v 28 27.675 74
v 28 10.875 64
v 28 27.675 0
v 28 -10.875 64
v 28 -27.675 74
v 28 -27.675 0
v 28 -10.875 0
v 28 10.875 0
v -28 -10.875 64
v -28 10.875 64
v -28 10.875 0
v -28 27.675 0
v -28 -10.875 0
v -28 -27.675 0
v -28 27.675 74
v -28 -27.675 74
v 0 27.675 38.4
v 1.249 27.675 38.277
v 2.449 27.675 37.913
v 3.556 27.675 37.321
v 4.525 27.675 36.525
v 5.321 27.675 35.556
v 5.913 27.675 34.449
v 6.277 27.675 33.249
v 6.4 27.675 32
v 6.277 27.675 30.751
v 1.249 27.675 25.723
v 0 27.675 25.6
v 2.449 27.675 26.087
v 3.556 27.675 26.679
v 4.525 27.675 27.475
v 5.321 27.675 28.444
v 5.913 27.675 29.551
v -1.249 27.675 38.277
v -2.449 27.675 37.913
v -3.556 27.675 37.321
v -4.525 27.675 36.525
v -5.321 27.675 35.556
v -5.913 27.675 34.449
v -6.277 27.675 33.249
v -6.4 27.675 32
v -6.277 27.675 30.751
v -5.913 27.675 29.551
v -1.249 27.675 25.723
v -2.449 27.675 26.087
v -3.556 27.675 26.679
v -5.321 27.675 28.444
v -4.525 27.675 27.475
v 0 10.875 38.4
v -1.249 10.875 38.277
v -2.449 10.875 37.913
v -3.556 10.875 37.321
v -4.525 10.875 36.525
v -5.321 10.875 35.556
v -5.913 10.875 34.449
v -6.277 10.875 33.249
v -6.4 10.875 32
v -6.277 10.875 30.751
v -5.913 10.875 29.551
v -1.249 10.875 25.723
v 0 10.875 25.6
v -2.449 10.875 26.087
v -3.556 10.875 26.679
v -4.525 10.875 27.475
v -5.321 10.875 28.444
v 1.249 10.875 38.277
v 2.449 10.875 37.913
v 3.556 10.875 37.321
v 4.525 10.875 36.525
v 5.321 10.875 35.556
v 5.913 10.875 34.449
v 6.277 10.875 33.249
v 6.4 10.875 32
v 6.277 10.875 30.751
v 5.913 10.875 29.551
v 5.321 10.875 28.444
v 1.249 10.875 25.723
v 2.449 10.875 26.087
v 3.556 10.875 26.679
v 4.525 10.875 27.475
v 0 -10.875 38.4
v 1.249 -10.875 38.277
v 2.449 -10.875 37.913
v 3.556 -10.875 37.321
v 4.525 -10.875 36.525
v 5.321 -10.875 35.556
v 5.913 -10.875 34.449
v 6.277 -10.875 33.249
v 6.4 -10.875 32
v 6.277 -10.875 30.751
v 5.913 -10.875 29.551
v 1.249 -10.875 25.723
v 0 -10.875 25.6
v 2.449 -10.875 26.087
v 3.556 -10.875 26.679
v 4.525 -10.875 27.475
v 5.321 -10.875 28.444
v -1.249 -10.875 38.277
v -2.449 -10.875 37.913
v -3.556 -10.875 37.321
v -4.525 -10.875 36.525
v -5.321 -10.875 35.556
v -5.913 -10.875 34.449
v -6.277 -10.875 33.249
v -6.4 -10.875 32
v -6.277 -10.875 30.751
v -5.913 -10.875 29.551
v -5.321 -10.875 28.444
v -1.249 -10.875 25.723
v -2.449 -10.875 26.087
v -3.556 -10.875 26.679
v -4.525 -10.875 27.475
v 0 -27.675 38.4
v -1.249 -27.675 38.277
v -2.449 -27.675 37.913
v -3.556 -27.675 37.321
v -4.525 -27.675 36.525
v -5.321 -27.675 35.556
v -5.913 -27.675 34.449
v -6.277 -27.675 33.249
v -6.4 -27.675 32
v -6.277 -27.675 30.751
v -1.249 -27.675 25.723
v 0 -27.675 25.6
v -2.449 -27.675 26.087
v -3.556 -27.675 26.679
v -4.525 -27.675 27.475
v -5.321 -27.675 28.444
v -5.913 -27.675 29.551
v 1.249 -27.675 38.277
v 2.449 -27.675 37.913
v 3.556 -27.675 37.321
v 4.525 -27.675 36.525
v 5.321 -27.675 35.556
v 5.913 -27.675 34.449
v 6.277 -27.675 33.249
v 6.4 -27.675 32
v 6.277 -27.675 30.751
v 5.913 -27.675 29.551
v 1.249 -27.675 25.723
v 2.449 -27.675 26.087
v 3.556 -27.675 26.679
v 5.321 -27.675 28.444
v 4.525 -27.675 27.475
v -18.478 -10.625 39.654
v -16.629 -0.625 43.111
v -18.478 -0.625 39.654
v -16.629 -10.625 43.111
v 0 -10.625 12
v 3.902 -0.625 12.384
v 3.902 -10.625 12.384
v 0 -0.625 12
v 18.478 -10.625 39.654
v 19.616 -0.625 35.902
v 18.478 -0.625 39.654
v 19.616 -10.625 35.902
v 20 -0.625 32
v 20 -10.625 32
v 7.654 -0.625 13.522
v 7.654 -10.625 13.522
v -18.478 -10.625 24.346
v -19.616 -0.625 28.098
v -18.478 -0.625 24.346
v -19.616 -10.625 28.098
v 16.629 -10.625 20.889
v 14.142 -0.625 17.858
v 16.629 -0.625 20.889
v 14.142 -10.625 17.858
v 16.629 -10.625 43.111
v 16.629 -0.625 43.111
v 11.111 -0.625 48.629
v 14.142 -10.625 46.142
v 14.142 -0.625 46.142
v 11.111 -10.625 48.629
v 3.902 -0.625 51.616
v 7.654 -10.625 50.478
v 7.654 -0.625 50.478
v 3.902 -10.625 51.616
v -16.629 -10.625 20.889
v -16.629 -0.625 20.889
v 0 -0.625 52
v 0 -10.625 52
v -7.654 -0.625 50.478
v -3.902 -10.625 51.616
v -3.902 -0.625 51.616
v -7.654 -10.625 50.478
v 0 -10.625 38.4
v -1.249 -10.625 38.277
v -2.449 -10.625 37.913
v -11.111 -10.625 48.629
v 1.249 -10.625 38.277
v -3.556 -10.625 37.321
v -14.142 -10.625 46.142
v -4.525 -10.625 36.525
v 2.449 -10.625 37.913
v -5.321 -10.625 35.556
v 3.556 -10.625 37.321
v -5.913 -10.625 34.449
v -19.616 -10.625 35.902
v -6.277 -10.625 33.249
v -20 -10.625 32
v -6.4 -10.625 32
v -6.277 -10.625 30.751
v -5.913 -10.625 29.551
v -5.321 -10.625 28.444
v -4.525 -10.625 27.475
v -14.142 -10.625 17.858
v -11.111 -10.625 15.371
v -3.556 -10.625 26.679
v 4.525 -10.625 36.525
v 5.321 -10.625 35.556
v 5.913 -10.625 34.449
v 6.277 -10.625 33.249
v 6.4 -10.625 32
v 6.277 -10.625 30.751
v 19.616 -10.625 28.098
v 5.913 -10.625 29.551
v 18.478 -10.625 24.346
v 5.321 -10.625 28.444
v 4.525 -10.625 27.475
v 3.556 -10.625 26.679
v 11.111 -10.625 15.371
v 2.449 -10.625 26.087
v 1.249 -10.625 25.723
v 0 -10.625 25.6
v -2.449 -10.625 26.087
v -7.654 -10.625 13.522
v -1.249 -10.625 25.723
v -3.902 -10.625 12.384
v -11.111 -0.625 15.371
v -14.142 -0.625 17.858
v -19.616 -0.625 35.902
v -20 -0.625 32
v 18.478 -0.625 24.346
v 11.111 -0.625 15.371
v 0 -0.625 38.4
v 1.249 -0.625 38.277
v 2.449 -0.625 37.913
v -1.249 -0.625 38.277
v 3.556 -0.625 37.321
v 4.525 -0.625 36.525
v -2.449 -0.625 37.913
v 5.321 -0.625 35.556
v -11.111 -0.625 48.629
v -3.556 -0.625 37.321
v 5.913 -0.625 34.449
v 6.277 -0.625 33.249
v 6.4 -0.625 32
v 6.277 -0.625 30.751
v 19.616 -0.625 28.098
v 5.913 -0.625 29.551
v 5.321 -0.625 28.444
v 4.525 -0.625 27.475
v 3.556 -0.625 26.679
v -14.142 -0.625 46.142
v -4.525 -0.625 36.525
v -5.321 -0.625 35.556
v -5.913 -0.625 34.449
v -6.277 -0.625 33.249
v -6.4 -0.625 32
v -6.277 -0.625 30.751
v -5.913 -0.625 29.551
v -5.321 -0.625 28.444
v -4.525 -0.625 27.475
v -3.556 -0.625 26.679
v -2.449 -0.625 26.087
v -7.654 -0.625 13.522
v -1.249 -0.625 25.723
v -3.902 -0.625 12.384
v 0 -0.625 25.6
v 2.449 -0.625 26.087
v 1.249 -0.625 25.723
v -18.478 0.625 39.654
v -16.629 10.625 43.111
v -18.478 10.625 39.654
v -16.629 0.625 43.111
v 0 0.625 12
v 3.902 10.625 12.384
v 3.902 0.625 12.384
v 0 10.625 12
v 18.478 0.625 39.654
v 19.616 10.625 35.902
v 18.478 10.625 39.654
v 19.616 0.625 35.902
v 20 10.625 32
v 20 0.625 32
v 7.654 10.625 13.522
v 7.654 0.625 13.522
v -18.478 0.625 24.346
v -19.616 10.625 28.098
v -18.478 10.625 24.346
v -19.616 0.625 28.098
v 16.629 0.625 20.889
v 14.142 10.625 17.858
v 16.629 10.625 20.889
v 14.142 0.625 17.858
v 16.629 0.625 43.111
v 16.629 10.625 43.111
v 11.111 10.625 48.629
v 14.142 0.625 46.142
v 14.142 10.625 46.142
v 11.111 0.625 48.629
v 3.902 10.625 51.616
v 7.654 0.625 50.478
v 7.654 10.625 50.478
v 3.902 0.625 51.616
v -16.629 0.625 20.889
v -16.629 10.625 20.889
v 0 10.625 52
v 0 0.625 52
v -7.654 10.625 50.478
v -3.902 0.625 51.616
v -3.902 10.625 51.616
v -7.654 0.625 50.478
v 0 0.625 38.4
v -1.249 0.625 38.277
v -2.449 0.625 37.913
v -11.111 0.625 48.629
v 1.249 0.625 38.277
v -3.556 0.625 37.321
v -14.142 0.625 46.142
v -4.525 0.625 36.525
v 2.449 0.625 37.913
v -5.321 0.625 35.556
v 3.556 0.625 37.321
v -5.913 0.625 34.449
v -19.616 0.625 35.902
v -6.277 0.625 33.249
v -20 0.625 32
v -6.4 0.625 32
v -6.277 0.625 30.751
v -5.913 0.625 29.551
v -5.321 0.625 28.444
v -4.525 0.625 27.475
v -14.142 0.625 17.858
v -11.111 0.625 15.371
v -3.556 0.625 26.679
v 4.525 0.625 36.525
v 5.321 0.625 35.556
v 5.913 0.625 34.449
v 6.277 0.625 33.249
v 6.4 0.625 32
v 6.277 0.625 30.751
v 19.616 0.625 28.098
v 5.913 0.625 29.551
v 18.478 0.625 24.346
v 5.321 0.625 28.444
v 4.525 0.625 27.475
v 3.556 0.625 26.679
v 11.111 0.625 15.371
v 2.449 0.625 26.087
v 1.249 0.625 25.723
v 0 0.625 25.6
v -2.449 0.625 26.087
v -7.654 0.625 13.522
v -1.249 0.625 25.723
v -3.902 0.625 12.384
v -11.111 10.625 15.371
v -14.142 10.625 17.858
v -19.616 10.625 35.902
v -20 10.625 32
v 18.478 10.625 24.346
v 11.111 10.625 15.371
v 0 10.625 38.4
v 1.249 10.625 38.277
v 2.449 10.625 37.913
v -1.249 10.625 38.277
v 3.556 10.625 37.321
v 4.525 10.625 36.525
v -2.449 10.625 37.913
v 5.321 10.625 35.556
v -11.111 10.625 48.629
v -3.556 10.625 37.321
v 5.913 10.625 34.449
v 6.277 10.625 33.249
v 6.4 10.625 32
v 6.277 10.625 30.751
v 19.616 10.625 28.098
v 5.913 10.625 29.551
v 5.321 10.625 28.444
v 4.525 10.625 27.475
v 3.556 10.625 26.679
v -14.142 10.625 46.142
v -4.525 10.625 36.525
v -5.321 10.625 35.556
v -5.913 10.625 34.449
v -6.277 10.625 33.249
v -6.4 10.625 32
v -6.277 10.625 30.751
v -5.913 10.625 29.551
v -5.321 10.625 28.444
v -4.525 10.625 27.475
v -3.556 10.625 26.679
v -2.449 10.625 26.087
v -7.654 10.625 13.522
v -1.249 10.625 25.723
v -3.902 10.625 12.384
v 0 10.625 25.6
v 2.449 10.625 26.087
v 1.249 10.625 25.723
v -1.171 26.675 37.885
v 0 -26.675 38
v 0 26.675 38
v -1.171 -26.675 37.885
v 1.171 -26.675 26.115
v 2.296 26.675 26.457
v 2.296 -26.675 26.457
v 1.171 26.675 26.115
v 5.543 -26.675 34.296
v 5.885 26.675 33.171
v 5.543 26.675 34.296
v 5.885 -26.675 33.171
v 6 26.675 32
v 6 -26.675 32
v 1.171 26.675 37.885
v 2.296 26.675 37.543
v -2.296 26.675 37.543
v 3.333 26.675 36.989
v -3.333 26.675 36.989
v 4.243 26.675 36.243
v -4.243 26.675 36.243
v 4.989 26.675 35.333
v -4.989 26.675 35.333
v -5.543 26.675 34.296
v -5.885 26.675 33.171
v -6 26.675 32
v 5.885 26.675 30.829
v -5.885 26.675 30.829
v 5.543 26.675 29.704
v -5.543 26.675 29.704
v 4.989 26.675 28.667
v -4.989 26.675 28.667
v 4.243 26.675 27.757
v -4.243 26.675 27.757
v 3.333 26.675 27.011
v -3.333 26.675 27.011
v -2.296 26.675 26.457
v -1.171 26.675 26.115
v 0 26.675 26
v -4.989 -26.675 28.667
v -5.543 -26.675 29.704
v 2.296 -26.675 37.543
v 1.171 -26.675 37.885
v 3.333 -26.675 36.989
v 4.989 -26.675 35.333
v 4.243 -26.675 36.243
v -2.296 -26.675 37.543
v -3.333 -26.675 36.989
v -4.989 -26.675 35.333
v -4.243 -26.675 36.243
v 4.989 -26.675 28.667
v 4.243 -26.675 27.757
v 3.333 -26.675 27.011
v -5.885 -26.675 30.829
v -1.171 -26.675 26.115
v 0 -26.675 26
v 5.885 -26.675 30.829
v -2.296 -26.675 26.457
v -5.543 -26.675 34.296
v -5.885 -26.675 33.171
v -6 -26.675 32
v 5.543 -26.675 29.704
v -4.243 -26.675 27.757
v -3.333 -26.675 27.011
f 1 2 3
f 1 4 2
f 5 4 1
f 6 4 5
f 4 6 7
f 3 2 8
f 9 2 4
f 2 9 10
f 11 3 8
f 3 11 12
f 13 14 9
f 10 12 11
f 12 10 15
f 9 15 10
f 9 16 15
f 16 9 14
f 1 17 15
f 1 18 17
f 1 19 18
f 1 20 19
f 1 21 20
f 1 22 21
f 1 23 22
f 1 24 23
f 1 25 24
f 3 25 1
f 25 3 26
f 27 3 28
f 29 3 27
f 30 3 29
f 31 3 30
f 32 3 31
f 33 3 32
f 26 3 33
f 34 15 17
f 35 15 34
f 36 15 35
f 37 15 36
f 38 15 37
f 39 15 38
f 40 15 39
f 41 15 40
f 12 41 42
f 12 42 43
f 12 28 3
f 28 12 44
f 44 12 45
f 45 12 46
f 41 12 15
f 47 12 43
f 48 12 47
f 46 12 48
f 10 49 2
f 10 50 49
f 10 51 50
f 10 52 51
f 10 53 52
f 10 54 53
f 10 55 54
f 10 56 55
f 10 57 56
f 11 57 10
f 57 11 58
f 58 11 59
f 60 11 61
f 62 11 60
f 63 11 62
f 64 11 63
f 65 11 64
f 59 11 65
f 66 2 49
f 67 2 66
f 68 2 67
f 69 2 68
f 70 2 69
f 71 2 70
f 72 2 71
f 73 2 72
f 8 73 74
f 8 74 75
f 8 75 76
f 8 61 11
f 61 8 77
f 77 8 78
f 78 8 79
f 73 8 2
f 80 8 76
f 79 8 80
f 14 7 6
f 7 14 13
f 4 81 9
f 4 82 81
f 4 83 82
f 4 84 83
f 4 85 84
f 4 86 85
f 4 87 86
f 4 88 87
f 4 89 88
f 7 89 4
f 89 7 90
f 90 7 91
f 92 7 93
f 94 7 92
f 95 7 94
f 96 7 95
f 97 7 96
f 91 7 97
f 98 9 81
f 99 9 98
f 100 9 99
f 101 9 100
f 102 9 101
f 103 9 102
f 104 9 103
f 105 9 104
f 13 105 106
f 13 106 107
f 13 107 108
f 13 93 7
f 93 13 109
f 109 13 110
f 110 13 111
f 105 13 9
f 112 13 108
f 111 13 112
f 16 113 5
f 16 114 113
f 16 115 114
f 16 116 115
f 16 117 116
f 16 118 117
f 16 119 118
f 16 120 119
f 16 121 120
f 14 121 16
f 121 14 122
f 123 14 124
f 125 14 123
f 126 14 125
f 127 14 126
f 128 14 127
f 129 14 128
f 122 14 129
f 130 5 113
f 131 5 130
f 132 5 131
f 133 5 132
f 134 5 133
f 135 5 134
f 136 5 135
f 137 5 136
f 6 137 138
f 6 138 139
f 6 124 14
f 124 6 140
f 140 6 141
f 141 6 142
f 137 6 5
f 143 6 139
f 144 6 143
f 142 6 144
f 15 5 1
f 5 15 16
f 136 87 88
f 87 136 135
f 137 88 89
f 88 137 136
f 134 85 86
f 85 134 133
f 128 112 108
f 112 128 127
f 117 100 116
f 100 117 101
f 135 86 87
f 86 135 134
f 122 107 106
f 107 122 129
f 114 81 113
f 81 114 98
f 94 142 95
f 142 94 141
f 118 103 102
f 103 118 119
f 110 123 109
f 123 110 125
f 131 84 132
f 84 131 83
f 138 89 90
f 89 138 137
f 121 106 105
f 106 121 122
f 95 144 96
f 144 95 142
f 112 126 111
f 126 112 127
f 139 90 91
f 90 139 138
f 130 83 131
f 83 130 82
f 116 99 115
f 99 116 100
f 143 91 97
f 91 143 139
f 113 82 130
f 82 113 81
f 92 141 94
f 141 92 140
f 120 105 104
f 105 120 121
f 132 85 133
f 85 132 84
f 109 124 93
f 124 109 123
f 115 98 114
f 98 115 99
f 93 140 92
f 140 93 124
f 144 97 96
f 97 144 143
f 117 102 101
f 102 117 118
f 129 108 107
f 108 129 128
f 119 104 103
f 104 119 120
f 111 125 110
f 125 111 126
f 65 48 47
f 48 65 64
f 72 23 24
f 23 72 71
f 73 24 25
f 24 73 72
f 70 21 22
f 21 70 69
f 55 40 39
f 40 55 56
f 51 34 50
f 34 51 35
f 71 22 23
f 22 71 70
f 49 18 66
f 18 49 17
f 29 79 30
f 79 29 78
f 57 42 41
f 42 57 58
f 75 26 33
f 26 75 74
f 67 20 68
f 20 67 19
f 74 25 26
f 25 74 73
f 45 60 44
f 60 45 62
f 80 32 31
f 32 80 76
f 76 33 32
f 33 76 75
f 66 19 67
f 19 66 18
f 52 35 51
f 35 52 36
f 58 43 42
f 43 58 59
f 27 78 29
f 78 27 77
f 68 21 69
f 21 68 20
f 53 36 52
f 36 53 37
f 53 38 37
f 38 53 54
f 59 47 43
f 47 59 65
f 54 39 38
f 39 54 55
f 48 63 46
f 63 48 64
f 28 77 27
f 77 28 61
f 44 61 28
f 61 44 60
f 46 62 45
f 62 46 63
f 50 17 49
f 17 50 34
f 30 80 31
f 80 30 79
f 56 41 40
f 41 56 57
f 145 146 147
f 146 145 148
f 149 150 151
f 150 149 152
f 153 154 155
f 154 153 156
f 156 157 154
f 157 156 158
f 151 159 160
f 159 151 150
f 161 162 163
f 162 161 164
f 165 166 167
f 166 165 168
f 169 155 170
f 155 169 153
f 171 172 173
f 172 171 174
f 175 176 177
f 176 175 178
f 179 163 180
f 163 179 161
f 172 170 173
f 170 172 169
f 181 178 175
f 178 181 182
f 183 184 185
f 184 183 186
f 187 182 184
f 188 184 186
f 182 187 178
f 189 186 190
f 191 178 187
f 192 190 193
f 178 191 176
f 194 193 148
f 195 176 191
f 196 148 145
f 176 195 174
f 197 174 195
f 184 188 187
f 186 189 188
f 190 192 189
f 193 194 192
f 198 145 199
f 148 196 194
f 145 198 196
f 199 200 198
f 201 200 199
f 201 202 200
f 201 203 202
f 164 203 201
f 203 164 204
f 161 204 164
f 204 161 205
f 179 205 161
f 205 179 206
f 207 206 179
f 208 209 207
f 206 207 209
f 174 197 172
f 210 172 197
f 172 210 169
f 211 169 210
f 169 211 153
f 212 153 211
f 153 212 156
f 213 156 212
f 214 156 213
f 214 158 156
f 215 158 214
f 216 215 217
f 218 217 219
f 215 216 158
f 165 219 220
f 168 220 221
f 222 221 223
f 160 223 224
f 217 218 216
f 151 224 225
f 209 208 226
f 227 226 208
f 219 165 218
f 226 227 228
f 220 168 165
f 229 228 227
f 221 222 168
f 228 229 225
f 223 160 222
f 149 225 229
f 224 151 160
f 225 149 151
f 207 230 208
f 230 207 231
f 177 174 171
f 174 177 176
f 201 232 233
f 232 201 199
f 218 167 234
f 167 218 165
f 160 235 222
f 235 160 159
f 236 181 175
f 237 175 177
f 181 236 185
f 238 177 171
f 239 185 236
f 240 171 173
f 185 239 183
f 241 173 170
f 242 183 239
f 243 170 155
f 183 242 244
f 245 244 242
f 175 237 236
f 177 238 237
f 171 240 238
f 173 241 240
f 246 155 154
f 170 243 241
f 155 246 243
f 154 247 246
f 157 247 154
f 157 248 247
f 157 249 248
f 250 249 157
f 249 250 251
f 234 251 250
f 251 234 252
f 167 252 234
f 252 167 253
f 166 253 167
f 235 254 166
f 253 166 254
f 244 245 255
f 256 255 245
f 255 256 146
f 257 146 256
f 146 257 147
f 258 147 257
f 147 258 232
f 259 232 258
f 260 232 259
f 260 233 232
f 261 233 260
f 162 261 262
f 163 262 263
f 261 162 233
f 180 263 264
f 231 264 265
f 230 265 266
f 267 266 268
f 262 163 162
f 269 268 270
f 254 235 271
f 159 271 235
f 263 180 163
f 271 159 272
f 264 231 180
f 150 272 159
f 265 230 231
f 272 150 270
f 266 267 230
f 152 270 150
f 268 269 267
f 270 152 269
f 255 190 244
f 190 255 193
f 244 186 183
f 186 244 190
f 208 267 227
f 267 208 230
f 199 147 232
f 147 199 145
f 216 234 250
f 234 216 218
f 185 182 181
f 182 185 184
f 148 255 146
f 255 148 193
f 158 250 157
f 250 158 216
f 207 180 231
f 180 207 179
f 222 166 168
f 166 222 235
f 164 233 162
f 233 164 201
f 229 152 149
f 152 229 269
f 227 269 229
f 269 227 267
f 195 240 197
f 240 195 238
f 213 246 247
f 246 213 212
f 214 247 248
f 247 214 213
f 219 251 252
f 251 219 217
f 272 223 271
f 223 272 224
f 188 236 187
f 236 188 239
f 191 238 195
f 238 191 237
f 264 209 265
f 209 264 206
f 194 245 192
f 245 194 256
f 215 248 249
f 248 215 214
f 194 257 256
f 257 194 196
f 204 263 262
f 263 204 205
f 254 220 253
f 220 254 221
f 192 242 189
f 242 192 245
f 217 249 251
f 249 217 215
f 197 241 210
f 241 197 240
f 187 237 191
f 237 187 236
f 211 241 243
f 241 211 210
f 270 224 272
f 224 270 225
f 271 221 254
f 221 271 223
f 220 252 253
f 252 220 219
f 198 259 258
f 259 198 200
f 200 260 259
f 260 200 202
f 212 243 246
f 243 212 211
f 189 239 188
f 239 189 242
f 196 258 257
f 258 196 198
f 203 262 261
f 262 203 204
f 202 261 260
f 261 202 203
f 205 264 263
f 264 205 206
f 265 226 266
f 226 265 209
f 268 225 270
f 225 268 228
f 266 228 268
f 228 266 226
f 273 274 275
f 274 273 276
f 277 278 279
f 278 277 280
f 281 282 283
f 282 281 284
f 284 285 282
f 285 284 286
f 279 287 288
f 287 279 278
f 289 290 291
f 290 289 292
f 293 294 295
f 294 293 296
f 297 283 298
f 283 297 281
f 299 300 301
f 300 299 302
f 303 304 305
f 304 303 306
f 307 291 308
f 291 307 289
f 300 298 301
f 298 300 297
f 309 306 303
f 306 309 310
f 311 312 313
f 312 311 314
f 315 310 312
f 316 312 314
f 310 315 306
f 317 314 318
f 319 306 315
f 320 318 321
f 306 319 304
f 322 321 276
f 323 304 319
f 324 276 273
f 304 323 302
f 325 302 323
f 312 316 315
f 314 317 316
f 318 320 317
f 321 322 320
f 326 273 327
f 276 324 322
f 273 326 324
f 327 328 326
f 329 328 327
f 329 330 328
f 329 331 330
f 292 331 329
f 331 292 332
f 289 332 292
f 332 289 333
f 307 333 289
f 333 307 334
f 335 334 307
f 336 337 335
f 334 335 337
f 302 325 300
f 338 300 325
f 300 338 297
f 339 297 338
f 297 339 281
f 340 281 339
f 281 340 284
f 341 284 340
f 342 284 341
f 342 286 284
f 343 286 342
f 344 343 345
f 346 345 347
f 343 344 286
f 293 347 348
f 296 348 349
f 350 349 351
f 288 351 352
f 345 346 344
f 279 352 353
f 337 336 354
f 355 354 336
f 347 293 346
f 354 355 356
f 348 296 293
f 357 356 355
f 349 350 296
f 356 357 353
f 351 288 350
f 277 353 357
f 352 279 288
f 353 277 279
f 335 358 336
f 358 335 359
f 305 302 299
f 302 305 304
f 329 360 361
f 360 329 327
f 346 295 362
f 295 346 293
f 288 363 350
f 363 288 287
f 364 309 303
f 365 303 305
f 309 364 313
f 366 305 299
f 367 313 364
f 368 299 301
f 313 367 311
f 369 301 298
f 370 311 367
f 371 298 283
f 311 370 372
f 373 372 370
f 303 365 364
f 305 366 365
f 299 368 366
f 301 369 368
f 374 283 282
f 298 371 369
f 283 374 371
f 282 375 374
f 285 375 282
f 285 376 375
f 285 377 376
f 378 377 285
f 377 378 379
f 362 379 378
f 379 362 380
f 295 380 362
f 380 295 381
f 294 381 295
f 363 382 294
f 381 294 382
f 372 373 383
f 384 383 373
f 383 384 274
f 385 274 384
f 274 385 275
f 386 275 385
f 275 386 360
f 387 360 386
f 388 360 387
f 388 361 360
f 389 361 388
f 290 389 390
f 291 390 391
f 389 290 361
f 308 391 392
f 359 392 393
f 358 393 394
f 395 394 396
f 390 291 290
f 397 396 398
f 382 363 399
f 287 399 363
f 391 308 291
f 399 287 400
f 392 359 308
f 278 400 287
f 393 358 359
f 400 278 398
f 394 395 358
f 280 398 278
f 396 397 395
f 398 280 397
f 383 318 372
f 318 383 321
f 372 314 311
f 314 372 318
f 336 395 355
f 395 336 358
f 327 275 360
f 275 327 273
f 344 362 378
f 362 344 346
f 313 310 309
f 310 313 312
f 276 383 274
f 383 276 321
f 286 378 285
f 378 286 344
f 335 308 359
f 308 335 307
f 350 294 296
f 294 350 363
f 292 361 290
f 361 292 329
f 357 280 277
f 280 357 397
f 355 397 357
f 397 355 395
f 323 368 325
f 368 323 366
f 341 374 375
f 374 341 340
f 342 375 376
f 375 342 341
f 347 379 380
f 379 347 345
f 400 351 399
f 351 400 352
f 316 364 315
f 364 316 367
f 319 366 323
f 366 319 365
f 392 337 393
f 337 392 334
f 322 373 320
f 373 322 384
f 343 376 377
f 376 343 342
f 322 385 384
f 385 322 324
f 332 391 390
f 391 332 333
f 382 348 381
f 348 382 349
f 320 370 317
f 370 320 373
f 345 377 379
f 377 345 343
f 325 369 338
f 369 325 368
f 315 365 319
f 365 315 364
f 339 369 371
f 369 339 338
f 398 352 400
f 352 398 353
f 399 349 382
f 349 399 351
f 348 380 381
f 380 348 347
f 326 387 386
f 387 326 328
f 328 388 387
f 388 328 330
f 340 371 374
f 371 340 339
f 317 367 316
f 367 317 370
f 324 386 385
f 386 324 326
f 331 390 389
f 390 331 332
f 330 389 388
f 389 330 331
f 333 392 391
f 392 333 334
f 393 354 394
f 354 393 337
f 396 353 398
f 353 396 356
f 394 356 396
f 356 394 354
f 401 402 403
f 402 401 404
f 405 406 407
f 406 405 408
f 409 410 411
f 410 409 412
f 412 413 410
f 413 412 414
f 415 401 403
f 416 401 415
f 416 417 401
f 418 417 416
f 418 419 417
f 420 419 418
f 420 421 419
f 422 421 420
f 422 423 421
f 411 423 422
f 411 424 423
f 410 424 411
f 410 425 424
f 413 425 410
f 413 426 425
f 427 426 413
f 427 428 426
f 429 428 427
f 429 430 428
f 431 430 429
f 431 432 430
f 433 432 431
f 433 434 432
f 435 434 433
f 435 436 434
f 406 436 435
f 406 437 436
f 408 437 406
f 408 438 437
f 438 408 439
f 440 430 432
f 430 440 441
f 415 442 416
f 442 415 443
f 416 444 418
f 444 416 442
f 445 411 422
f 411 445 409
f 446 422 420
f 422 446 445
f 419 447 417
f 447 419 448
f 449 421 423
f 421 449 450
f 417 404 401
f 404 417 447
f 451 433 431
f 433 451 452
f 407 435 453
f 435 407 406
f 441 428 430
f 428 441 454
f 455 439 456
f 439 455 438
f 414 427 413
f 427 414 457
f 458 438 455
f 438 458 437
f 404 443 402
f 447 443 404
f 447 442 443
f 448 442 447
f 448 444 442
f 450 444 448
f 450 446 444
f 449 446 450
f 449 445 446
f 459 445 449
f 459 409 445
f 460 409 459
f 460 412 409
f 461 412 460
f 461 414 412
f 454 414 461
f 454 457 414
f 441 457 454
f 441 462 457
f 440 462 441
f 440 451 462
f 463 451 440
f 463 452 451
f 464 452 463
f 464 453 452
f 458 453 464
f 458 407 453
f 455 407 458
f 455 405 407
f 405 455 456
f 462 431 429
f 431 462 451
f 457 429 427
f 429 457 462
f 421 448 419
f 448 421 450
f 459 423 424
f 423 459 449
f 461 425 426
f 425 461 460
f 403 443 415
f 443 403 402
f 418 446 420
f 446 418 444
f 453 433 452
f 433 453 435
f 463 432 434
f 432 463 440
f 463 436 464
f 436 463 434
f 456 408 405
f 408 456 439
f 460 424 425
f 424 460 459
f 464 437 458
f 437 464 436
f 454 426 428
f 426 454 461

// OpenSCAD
$fn = 32;

// ------------------------------------------------------------------------
// Trolley wheel set: wheels d40, fork 64 mm tall
// Every part is its own module, assembly() places every instance.
// ------------------------------------------------------------------------

// --- part 1 ---
module trolley_fork() {
  difference() {
    union() {
      translate([-28, 10.875, 0]) cube([56, 16.8, 64]);
      translate([-28, -27.675, 0]) cube([56, 16.8, 64]);
      translate([-28, -27.675, 64]) cube([56, 55.35, 10]);
    }
    translate([0, -19.275, 32]) rotate([90, 0, 0]) cylinder(h = 18.8, d = 12.8, center = true);
    translate([0, 19.275, 32]) rotate([90, 0, 0]) cylinder(h = 18.8, d = 12.8, center = true);
  }
}

// --- part 2 ---
module trolley_wheel() {
  difference() {
      translate([0, 0, 0]) cylinder(h = 10, d = 40);
      translate([0, 0, -1]) cylinder(h = 12, d = 12.8);
    }
}

// --- part 3 ---
module trolley_axle() {
  translate([0, 0, -26.675]) cylinder(h = 53.35, d = 12);
}

// --- assembly ---
module assembly() {
  color([0.80, 0.24, 0.20]) translate([0, 0, 0]) rotate([0, 0, 0]) trolley_fork();
  color([0.20, 0.45, 0.75]) translate([0, -0.625, 32]) rotate([90, 0, 0]) trolley_wheel();
  color([0.25, 0.62, 0.32]) translate([0, 10.625, 32]) rotate([90, 0, 0]) trolley_wheel();
  color([0.92, 0.70, 0.18]) translate([0, 0, 32]) rotate([90, 0, 0]) trolley_axle();
}

assembly();
